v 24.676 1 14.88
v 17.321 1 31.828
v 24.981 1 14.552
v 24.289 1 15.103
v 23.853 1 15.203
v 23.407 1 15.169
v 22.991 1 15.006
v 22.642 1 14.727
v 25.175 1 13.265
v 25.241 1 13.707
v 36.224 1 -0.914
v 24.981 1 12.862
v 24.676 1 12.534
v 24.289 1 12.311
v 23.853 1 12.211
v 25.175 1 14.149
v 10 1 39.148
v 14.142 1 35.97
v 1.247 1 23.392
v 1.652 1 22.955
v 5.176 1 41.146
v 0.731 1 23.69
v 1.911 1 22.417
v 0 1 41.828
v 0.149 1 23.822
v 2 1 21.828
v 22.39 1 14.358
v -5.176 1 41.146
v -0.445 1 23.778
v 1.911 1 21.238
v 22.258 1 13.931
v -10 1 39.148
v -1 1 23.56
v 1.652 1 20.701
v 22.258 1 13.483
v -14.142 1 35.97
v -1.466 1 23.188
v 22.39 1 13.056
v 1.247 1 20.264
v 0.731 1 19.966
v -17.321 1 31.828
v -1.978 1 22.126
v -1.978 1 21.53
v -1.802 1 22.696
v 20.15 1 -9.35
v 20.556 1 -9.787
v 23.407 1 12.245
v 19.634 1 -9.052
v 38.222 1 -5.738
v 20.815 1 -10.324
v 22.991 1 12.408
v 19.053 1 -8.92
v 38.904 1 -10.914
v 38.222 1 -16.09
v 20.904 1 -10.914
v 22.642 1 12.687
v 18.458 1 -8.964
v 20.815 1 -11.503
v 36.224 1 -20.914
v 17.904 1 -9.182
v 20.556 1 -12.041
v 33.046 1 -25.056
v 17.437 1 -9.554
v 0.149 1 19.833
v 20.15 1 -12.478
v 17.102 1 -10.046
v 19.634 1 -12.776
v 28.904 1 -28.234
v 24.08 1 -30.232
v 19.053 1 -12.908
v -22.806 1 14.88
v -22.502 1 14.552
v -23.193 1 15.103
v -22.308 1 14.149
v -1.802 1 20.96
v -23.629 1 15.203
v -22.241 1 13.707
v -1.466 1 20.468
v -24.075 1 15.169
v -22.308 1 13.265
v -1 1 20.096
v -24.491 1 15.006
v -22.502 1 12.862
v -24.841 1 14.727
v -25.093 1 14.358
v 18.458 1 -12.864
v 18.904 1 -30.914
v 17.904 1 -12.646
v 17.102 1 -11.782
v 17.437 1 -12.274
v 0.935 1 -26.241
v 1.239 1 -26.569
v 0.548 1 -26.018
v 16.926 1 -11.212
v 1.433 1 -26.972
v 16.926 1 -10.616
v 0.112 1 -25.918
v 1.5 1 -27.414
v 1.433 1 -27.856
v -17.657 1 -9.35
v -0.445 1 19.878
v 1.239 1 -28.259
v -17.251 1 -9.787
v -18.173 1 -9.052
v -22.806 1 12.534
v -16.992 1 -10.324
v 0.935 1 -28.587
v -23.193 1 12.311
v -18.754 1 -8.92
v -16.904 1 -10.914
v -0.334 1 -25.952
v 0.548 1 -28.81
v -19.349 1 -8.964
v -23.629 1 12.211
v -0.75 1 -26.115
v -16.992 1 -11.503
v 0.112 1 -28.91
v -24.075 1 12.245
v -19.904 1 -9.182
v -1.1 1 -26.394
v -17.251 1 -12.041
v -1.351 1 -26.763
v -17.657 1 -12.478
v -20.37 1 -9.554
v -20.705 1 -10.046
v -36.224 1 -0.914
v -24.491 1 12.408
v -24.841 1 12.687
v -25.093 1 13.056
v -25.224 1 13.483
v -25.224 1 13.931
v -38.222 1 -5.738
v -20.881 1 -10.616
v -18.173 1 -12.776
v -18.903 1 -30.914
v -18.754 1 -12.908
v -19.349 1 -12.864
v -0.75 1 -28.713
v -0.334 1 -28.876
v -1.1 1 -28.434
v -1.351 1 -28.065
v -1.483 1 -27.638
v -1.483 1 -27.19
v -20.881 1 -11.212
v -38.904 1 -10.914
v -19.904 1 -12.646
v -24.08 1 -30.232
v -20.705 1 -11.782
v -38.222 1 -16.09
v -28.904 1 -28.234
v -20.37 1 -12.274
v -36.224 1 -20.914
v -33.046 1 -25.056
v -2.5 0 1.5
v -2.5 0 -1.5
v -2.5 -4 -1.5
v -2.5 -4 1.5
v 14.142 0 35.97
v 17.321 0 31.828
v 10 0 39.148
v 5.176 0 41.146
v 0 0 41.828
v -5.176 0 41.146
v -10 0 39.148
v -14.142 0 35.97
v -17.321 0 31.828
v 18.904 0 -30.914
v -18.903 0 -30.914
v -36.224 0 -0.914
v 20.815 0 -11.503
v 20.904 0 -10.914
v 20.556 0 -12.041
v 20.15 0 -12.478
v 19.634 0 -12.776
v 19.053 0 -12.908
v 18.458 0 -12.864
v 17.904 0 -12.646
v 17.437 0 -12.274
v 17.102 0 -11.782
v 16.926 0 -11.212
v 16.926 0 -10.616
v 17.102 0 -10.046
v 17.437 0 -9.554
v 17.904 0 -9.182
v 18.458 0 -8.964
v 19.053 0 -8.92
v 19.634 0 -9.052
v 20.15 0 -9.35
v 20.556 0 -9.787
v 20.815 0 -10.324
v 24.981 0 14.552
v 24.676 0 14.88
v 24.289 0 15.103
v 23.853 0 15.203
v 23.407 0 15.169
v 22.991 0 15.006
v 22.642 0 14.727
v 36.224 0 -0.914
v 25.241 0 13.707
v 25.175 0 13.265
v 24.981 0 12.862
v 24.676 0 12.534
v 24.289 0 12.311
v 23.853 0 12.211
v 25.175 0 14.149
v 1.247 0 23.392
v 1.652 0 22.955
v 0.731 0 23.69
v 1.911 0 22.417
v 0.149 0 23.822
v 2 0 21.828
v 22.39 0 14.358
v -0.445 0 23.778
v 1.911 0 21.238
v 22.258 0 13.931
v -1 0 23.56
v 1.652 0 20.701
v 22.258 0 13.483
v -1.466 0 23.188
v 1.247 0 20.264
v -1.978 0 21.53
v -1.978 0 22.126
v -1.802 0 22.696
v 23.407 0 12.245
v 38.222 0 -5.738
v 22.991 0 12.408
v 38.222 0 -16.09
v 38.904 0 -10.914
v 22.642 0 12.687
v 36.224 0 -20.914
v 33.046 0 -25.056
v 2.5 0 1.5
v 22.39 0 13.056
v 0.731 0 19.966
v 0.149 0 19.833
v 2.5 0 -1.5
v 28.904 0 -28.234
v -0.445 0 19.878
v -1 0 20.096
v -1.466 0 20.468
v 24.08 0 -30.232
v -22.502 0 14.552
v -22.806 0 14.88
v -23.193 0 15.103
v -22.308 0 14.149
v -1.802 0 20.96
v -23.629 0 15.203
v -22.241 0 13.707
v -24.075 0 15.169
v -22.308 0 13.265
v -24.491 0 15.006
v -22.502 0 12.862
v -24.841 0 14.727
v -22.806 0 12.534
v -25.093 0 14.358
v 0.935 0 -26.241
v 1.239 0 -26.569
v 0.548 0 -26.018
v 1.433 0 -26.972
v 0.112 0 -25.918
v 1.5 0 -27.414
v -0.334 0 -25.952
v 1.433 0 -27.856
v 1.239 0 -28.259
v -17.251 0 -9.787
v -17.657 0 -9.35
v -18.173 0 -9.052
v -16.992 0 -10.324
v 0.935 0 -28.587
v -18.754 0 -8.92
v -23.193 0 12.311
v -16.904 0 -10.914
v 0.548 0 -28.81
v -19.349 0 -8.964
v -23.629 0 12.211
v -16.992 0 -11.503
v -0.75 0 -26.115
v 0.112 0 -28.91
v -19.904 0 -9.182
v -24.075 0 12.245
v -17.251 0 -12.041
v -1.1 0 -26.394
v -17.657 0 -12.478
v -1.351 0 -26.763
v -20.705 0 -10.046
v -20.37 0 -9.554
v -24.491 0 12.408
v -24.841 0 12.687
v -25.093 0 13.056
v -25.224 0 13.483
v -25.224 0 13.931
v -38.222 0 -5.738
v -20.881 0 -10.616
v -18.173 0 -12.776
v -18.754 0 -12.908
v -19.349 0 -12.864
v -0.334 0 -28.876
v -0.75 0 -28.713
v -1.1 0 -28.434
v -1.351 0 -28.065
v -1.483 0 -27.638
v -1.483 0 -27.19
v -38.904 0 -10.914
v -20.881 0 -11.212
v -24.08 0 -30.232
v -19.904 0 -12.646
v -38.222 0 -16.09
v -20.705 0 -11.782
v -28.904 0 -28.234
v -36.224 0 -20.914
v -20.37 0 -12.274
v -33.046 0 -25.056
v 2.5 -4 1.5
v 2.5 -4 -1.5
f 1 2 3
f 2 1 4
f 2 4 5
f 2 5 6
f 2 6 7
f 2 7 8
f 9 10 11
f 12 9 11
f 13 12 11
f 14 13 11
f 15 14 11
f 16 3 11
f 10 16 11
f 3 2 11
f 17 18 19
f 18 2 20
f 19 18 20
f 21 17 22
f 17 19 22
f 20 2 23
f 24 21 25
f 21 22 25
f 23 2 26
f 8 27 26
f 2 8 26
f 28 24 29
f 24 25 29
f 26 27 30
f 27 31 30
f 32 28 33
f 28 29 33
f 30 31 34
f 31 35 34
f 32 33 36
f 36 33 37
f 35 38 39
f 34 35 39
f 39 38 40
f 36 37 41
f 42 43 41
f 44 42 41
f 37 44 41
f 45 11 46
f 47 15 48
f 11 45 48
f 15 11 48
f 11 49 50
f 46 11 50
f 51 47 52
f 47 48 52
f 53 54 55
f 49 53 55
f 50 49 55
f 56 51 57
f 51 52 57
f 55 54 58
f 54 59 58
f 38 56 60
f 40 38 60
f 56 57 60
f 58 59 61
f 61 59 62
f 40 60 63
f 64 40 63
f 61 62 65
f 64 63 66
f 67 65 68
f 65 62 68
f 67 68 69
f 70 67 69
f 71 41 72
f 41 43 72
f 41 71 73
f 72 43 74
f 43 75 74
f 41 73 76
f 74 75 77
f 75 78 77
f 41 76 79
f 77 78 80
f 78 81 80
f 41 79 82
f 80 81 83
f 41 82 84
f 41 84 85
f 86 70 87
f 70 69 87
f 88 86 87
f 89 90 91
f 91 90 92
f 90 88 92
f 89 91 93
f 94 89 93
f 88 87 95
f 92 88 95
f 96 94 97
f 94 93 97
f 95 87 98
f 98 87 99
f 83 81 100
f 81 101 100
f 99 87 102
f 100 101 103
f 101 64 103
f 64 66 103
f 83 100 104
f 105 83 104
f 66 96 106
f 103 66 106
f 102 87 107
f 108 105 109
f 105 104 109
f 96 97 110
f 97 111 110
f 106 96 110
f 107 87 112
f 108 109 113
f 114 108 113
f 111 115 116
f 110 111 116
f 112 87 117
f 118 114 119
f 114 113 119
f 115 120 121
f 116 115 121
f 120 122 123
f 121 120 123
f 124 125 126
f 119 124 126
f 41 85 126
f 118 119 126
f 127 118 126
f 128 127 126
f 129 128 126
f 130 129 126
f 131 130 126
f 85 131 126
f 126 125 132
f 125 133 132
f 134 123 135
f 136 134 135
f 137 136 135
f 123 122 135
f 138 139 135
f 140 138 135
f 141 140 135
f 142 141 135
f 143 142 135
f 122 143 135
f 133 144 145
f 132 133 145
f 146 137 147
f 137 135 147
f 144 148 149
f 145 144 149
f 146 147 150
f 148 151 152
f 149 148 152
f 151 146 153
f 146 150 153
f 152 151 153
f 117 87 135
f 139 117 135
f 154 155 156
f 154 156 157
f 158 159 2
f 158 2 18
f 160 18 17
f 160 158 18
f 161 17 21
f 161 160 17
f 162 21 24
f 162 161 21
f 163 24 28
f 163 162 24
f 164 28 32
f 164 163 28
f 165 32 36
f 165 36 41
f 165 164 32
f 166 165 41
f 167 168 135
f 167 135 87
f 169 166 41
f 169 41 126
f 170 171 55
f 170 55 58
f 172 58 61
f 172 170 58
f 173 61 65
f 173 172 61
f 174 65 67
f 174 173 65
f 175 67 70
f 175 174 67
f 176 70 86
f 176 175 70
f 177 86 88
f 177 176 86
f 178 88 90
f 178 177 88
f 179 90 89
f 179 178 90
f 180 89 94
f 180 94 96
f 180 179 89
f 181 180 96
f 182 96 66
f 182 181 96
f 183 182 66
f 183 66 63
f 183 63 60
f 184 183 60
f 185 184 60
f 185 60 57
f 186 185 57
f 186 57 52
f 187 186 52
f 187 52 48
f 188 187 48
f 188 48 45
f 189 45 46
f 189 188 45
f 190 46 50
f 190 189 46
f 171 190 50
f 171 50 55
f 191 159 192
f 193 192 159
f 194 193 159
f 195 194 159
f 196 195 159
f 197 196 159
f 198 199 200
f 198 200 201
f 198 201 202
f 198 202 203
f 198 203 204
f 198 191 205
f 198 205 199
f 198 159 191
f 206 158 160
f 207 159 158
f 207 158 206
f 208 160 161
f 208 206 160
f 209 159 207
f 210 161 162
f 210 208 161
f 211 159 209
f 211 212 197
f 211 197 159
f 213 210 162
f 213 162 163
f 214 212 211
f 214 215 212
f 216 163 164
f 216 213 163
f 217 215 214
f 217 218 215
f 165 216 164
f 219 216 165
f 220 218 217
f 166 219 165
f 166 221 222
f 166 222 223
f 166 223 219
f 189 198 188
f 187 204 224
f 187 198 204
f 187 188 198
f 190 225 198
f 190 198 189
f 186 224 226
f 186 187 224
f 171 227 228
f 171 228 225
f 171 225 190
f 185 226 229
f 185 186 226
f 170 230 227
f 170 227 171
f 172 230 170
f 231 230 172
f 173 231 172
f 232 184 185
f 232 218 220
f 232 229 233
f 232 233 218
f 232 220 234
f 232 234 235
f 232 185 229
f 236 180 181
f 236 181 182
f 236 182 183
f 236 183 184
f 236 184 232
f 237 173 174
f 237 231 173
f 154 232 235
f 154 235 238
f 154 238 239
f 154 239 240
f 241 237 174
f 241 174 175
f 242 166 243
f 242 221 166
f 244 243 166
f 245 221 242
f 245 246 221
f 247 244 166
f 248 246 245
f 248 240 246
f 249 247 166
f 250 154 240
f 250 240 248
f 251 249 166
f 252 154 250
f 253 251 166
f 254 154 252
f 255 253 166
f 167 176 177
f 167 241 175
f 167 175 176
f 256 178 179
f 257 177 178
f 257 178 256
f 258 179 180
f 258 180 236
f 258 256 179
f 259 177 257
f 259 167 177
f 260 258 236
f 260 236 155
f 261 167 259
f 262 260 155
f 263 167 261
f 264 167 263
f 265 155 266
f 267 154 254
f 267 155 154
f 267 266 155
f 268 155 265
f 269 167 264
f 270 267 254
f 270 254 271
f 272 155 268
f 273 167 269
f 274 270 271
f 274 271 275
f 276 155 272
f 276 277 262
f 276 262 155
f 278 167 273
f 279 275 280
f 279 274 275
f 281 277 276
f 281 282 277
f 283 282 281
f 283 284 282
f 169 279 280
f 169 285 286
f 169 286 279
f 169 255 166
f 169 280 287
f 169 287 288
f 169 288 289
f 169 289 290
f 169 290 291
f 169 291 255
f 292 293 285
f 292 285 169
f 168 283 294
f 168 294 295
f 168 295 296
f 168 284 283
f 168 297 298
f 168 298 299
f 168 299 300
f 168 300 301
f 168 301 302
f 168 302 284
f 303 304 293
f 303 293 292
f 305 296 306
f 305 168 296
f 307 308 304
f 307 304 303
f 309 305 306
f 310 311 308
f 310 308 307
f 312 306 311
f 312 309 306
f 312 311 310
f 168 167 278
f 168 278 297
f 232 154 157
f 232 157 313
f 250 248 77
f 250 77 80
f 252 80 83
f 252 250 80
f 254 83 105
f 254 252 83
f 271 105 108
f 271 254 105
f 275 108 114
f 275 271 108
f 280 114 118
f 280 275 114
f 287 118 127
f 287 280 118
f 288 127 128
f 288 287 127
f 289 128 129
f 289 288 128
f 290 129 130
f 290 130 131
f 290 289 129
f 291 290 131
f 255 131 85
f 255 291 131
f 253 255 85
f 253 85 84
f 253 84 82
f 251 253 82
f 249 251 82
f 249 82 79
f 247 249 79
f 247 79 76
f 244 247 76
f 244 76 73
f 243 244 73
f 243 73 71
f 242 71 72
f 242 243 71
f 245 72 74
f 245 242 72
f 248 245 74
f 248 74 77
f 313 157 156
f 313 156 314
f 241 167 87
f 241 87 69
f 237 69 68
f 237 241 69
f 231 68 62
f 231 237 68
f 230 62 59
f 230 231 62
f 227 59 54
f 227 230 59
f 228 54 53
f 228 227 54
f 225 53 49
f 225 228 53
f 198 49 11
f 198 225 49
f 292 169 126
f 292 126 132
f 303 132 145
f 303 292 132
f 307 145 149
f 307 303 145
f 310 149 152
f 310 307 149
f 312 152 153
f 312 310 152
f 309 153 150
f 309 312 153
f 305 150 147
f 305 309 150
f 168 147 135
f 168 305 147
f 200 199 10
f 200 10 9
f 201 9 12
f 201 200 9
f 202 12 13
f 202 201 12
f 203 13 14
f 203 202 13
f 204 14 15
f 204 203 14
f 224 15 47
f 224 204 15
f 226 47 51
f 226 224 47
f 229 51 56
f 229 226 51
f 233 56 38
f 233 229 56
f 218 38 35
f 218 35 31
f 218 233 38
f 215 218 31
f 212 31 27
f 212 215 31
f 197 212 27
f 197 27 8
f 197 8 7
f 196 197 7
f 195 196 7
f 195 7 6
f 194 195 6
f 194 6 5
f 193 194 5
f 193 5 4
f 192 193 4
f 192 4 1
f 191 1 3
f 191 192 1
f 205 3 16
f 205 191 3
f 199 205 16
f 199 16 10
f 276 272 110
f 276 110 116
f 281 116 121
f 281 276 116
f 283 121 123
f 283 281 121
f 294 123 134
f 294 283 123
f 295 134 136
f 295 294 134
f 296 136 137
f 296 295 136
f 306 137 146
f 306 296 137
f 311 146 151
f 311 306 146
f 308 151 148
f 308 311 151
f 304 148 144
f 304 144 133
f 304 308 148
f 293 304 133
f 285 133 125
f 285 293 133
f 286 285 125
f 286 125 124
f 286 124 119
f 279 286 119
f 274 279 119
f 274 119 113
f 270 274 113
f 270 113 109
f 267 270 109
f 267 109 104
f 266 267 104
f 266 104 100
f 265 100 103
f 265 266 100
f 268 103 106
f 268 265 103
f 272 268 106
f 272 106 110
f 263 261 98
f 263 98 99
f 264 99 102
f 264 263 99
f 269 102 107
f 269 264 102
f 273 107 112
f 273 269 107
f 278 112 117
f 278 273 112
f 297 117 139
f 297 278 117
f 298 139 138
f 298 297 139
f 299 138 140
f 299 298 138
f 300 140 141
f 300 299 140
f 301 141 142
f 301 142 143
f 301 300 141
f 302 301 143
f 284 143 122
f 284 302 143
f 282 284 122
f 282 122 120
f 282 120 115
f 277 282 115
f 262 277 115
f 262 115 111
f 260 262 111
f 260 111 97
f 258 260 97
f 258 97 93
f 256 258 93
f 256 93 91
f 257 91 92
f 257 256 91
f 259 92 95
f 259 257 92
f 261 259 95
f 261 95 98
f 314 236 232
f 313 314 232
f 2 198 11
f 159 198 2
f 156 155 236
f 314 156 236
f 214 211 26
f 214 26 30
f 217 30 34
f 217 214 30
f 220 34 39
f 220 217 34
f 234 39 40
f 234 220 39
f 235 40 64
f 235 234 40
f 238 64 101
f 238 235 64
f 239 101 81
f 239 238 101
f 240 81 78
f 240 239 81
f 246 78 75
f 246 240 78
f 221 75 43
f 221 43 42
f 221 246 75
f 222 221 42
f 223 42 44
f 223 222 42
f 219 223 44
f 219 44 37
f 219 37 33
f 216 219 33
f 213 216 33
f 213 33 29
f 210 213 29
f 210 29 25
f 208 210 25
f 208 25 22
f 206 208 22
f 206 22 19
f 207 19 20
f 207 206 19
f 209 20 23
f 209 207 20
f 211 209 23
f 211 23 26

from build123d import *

# Parameters (mm, degrees)
SKETCH1_R           = 2
SKETCH1_R_2         = 1.5
BOSS_EXTRUDE1_DEPTH = 1
SKETCH2_W           = 5
SKETCH2_H           = 3
BOSS_EXTRUDE2_DEPTH = 4


with BuildPart() as part:
    # Sketch1 → Boss-Extrude1 (new body)
    with BuildSketch(Plane(origin=(0, 0, 0), x_dir=(1, 0, 0), z_dir=(0, 1, 0))):
        with BuildLine():
            Line((36.224008076, 0.913940814), (17.320508076, -31.827881627))
            ThreePointArc((17.320508076, -31.827881627), (0, -41.827881627), (-17.320508076, -31.827881627))
            Line((-17.320508076, -31.827881627), (-36.224008076, 0.913940814))
            ThreePointArc((-36.224008076, 0.913940814), (-36.224008076, 20.913940814), (-18.9035, 30.913940814))
            Line((-18.9035, 30.913940814), (18.9035, 30.913940814))
            ThreePointArc((18.9035, 30.913940814), (36.224008076, 20.913940814), (36.224008076, 0.913940814))
        make_face()
        with Locations((-18.9035, 10.913940814)):
            Circle(SKETCH1_R, mode=Mode.SUBTRACT)
        with Locations((18.9035, 10.913940814)):
            Circle(SKETCH1_R, mode=Mode.SUBTRACT)
        with Locations((0, -21.827881627)):
            Circle(SKETCH1_R, mode=Mode.SUBTRACT)
        with Locations((-23.741169162, -13.706970407)):
            Circle(SKETCH1_R_2, mode=Mode.SUBTRACT)
        with Locations((23.741169162, -13.706970407)):
            Circle(SKETCH1_R_2, mode=Mode.SUBTRACT)
        with Locations((0, 27.413940814)):
            Circle(SKETCH1_R_2, mode=Mode.SUBTRACT)
    extrude(amount=BOSS_EXTRUDE1_DEPTH)

    # Sketch2 → Boss-Extrude2 (add)
    with BuildSketch(Plane.XZ):
        Rectangle(SKETCH2_W, SKETCH2_H)
    extrude(amount=BOSS_EXTRUDE2_DEPTH)


solid = part.part
